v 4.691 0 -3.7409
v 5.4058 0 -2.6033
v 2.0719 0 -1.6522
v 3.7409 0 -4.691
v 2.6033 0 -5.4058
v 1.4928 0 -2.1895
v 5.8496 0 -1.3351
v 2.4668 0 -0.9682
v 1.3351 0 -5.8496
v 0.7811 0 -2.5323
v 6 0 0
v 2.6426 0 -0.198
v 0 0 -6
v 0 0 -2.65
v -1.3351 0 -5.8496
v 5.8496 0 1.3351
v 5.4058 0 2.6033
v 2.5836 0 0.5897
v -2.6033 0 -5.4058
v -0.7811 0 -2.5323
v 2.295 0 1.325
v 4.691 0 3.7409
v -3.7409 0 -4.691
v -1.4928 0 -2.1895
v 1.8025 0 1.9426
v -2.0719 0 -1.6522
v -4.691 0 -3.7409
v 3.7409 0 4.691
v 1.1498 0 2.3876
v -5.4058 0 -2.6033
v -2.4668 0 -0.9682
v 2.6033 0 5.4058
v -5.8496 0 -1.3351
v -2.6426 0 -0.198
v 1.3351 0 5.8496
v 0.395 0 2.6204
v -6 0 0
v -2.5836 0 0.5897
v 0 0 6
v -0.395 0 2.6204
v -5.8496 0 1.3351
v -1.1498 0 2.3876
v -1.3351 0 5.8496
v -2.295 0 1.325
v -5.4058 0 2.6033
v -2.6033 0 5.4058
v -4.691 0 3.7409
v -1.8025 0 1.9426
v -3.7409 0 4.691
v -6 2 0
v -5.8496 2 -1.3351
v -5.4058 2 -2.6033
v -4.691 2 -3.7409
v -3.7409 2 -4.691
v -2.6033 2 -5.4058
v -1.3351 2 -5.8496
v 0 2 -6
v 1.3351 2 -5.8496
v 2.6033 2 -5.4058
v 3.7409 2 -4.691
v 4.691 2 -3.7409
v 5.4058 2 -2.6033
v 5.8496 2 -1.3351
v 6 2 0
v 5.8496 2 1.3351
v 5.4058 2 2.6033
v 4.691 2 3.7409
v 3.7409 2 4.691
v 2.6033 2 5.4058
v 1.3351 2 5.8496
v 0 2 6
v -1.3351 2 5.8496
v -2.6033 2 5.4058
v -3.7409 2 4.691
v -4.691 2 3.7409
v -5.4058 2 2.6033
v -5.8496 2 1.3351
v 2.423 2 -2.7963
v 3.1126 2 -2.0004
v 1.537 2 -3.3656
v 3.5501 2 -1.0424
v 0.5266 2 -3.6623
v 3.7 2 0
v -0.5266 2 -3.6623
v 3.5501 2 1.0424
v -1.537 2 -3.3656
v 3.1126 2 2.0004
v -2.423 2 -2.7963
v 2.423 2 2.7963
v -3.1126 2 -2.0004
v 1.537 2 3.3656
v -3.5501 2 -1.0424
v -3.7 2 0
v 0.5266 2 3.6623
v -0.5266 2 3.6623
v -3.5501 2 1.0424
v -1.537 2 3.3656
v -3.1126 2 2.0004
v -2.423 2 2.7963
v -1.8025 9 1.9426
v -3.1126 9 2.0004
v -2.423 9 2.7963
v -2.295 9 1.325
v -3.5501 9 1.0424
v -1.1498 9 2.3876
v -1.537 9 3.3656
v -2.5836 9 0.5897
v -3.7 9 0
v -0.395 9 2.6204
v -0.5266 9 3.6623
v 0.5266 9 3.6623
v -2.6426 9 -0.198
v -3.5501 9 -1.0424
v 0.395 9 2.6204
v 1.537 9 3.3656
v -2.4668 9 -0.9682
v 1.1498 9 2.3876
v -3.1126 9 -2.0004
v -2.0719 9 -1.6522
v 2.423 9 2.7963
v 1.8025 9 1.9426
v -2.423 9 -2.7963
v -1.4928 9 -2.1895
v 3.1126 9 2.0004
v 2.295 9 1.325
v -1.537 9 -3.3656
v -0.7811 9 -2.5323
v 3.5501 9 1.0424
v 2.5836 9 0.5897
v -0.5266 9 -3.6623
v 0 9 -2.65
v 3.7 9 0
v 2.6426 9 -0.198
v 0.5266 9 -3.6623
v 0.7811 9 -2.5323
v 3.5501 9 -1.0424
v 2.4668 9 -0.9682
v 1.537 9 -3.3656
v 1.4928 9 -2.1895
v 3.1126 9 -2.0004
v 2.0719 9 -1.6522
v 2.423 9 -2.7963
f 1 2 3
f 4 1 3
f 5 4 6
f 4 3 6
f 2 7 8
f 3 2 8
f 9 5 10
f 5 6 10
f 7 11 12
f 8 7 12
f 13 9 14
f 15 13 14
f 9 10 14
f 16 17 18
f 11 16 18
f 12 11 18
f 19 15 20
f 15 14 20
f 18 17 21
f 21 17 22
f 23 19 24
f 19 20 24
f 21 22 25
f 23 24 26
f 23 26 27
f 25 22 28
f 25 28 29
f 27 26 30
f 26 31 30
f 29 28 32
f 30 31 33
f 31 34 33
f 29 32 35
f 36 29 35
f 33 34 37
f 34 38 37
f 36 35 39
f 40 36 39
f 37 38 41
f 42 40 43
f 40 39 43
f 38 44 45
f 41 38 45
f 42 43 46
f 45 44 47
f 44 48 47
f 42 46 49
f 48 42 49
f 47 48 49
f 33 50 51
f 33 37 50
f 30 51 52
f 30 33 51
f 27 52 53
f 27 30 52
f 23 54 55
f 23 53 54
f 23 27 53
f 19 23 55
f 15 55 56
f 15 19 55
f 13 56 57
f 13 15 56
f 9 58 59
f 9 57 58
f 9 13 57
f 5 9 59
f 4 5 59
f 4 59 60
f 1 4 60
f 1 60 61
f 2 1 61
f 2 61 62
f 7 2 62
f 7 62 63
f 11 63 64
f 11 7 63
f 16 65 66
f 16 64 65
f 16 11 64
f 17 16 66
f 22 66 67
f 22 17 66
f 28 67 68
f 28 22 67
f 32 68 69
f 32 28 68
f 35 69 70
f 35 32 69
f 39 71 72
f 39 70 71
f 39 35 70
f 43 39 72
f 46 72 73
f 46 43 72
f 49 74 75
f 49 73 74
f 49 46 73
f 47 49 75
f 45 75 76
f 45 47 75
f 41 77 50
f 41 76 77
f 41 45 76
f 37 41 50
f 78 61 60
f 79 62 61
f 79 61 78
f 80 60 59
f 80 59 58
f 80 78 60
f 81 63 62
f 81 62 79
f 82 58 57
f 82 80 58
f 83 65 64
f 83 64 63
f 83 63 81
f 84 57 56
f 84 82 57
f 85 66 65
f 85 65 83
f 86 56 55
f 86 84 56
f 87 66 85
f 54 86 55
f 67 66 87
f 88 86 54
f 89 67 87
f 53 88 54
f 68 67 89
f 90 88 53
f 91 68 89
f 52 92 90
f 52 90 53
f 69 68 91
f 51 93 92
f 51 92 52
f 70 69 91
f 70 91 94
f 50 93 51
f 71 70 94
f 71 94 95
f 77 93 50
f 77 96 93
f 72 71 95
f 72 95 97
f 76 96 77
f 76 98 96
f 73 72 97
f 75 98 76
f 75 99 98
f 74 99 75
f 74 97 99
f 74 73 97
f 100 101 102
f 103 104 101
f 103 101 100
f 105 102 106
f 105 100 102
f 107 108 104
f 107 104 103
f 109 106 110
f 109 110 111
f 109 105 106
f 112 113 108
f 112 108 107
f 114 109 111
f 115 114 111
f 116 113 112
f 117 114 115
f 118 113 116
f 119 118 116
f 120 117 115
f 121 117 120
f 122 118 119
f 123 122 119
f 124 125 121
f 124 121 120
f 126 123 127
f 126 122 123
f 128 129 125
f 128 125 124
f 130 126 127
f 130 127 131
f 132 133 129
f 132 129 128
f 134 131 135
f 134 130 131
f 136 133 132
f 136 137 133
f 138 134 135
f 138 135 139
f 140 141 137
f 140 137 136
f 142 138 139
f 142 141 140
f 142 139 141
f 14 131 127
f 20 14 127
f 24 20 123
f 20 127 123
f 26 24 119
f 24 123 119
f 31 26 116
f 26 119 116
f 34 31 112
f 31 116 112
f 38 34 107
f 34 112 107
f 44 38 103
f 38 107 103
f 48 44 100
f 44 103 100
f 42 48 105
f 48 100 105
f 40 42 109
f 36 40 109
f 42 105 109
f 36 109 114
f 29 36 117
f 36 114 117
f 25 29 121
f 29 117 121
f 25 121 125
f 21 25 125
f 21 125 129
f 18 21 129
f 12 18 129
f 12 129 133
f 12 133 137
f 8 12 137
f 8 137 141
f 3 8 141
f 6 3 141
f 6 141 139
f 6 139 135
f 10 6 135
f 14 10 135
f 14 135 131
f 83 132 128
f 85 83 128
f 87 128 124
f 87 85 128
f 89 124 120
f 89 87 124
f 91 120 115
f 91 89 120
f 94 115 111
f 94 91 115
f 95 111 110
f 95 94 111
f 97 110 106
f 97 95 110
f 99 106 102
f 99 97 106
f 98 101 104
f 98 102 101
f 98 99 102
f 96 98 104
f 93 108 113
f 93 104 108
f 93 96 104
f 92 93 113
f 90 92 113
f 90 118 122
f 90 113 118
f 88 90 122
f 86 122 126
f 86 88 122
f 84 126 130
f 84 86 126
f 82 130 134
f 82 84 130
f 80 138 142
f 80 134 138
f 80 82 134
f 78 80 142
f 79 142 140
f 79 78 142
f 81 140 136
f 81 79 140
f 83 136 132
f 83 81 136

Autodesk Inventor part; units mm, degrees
ref_plane "YZ Plane" through (0, 0, 0) normal (1, 0, 0) x (0, 1, 0)
ref_plane "XZ Plane" through (0, 0, 0) normal (0, 1, 0) x (-1, 0, 0)
ref_plane "XY Plane" through (0, 0, 0) normal (0, 0, 1) x (1, 0, 0)
sketch "Sketch1" plane through (0, 0, 0) normal (0, 1, 0) x (-1, 0, 0)
  circle A0 centre (0, 0) radius 6
  dimension "d0" = 12
extrude "Extrusion1" add sketch "Sketch1" along normal blind 2
sketch "Sketch2" plane through (0, 2, 0) normal (0, 1, 0) x (1, 0, 0)
  circle A0 centre (0, 0) radius 6 construction
  circle A1 centre (0, 0) radius 3.7
  dimension "d3" = 7.4
extrude "Extrusion2" add sketch "Sketch2" along normal blind 7
sketch "Sketch3" plane through (0, 0, 0) normal (0, -1, 0) x (1, 0, 0)
  circle A0 centre (0, 0) radius 6 construction
hole "Hole1" at (0, 0, 0) direction (0, 1, 0) diameter 5.3 end through all
equation "\"d1\" = SPACING"
equation "\"SPACING\" = 2"
properties part number "BearingSpacer"
